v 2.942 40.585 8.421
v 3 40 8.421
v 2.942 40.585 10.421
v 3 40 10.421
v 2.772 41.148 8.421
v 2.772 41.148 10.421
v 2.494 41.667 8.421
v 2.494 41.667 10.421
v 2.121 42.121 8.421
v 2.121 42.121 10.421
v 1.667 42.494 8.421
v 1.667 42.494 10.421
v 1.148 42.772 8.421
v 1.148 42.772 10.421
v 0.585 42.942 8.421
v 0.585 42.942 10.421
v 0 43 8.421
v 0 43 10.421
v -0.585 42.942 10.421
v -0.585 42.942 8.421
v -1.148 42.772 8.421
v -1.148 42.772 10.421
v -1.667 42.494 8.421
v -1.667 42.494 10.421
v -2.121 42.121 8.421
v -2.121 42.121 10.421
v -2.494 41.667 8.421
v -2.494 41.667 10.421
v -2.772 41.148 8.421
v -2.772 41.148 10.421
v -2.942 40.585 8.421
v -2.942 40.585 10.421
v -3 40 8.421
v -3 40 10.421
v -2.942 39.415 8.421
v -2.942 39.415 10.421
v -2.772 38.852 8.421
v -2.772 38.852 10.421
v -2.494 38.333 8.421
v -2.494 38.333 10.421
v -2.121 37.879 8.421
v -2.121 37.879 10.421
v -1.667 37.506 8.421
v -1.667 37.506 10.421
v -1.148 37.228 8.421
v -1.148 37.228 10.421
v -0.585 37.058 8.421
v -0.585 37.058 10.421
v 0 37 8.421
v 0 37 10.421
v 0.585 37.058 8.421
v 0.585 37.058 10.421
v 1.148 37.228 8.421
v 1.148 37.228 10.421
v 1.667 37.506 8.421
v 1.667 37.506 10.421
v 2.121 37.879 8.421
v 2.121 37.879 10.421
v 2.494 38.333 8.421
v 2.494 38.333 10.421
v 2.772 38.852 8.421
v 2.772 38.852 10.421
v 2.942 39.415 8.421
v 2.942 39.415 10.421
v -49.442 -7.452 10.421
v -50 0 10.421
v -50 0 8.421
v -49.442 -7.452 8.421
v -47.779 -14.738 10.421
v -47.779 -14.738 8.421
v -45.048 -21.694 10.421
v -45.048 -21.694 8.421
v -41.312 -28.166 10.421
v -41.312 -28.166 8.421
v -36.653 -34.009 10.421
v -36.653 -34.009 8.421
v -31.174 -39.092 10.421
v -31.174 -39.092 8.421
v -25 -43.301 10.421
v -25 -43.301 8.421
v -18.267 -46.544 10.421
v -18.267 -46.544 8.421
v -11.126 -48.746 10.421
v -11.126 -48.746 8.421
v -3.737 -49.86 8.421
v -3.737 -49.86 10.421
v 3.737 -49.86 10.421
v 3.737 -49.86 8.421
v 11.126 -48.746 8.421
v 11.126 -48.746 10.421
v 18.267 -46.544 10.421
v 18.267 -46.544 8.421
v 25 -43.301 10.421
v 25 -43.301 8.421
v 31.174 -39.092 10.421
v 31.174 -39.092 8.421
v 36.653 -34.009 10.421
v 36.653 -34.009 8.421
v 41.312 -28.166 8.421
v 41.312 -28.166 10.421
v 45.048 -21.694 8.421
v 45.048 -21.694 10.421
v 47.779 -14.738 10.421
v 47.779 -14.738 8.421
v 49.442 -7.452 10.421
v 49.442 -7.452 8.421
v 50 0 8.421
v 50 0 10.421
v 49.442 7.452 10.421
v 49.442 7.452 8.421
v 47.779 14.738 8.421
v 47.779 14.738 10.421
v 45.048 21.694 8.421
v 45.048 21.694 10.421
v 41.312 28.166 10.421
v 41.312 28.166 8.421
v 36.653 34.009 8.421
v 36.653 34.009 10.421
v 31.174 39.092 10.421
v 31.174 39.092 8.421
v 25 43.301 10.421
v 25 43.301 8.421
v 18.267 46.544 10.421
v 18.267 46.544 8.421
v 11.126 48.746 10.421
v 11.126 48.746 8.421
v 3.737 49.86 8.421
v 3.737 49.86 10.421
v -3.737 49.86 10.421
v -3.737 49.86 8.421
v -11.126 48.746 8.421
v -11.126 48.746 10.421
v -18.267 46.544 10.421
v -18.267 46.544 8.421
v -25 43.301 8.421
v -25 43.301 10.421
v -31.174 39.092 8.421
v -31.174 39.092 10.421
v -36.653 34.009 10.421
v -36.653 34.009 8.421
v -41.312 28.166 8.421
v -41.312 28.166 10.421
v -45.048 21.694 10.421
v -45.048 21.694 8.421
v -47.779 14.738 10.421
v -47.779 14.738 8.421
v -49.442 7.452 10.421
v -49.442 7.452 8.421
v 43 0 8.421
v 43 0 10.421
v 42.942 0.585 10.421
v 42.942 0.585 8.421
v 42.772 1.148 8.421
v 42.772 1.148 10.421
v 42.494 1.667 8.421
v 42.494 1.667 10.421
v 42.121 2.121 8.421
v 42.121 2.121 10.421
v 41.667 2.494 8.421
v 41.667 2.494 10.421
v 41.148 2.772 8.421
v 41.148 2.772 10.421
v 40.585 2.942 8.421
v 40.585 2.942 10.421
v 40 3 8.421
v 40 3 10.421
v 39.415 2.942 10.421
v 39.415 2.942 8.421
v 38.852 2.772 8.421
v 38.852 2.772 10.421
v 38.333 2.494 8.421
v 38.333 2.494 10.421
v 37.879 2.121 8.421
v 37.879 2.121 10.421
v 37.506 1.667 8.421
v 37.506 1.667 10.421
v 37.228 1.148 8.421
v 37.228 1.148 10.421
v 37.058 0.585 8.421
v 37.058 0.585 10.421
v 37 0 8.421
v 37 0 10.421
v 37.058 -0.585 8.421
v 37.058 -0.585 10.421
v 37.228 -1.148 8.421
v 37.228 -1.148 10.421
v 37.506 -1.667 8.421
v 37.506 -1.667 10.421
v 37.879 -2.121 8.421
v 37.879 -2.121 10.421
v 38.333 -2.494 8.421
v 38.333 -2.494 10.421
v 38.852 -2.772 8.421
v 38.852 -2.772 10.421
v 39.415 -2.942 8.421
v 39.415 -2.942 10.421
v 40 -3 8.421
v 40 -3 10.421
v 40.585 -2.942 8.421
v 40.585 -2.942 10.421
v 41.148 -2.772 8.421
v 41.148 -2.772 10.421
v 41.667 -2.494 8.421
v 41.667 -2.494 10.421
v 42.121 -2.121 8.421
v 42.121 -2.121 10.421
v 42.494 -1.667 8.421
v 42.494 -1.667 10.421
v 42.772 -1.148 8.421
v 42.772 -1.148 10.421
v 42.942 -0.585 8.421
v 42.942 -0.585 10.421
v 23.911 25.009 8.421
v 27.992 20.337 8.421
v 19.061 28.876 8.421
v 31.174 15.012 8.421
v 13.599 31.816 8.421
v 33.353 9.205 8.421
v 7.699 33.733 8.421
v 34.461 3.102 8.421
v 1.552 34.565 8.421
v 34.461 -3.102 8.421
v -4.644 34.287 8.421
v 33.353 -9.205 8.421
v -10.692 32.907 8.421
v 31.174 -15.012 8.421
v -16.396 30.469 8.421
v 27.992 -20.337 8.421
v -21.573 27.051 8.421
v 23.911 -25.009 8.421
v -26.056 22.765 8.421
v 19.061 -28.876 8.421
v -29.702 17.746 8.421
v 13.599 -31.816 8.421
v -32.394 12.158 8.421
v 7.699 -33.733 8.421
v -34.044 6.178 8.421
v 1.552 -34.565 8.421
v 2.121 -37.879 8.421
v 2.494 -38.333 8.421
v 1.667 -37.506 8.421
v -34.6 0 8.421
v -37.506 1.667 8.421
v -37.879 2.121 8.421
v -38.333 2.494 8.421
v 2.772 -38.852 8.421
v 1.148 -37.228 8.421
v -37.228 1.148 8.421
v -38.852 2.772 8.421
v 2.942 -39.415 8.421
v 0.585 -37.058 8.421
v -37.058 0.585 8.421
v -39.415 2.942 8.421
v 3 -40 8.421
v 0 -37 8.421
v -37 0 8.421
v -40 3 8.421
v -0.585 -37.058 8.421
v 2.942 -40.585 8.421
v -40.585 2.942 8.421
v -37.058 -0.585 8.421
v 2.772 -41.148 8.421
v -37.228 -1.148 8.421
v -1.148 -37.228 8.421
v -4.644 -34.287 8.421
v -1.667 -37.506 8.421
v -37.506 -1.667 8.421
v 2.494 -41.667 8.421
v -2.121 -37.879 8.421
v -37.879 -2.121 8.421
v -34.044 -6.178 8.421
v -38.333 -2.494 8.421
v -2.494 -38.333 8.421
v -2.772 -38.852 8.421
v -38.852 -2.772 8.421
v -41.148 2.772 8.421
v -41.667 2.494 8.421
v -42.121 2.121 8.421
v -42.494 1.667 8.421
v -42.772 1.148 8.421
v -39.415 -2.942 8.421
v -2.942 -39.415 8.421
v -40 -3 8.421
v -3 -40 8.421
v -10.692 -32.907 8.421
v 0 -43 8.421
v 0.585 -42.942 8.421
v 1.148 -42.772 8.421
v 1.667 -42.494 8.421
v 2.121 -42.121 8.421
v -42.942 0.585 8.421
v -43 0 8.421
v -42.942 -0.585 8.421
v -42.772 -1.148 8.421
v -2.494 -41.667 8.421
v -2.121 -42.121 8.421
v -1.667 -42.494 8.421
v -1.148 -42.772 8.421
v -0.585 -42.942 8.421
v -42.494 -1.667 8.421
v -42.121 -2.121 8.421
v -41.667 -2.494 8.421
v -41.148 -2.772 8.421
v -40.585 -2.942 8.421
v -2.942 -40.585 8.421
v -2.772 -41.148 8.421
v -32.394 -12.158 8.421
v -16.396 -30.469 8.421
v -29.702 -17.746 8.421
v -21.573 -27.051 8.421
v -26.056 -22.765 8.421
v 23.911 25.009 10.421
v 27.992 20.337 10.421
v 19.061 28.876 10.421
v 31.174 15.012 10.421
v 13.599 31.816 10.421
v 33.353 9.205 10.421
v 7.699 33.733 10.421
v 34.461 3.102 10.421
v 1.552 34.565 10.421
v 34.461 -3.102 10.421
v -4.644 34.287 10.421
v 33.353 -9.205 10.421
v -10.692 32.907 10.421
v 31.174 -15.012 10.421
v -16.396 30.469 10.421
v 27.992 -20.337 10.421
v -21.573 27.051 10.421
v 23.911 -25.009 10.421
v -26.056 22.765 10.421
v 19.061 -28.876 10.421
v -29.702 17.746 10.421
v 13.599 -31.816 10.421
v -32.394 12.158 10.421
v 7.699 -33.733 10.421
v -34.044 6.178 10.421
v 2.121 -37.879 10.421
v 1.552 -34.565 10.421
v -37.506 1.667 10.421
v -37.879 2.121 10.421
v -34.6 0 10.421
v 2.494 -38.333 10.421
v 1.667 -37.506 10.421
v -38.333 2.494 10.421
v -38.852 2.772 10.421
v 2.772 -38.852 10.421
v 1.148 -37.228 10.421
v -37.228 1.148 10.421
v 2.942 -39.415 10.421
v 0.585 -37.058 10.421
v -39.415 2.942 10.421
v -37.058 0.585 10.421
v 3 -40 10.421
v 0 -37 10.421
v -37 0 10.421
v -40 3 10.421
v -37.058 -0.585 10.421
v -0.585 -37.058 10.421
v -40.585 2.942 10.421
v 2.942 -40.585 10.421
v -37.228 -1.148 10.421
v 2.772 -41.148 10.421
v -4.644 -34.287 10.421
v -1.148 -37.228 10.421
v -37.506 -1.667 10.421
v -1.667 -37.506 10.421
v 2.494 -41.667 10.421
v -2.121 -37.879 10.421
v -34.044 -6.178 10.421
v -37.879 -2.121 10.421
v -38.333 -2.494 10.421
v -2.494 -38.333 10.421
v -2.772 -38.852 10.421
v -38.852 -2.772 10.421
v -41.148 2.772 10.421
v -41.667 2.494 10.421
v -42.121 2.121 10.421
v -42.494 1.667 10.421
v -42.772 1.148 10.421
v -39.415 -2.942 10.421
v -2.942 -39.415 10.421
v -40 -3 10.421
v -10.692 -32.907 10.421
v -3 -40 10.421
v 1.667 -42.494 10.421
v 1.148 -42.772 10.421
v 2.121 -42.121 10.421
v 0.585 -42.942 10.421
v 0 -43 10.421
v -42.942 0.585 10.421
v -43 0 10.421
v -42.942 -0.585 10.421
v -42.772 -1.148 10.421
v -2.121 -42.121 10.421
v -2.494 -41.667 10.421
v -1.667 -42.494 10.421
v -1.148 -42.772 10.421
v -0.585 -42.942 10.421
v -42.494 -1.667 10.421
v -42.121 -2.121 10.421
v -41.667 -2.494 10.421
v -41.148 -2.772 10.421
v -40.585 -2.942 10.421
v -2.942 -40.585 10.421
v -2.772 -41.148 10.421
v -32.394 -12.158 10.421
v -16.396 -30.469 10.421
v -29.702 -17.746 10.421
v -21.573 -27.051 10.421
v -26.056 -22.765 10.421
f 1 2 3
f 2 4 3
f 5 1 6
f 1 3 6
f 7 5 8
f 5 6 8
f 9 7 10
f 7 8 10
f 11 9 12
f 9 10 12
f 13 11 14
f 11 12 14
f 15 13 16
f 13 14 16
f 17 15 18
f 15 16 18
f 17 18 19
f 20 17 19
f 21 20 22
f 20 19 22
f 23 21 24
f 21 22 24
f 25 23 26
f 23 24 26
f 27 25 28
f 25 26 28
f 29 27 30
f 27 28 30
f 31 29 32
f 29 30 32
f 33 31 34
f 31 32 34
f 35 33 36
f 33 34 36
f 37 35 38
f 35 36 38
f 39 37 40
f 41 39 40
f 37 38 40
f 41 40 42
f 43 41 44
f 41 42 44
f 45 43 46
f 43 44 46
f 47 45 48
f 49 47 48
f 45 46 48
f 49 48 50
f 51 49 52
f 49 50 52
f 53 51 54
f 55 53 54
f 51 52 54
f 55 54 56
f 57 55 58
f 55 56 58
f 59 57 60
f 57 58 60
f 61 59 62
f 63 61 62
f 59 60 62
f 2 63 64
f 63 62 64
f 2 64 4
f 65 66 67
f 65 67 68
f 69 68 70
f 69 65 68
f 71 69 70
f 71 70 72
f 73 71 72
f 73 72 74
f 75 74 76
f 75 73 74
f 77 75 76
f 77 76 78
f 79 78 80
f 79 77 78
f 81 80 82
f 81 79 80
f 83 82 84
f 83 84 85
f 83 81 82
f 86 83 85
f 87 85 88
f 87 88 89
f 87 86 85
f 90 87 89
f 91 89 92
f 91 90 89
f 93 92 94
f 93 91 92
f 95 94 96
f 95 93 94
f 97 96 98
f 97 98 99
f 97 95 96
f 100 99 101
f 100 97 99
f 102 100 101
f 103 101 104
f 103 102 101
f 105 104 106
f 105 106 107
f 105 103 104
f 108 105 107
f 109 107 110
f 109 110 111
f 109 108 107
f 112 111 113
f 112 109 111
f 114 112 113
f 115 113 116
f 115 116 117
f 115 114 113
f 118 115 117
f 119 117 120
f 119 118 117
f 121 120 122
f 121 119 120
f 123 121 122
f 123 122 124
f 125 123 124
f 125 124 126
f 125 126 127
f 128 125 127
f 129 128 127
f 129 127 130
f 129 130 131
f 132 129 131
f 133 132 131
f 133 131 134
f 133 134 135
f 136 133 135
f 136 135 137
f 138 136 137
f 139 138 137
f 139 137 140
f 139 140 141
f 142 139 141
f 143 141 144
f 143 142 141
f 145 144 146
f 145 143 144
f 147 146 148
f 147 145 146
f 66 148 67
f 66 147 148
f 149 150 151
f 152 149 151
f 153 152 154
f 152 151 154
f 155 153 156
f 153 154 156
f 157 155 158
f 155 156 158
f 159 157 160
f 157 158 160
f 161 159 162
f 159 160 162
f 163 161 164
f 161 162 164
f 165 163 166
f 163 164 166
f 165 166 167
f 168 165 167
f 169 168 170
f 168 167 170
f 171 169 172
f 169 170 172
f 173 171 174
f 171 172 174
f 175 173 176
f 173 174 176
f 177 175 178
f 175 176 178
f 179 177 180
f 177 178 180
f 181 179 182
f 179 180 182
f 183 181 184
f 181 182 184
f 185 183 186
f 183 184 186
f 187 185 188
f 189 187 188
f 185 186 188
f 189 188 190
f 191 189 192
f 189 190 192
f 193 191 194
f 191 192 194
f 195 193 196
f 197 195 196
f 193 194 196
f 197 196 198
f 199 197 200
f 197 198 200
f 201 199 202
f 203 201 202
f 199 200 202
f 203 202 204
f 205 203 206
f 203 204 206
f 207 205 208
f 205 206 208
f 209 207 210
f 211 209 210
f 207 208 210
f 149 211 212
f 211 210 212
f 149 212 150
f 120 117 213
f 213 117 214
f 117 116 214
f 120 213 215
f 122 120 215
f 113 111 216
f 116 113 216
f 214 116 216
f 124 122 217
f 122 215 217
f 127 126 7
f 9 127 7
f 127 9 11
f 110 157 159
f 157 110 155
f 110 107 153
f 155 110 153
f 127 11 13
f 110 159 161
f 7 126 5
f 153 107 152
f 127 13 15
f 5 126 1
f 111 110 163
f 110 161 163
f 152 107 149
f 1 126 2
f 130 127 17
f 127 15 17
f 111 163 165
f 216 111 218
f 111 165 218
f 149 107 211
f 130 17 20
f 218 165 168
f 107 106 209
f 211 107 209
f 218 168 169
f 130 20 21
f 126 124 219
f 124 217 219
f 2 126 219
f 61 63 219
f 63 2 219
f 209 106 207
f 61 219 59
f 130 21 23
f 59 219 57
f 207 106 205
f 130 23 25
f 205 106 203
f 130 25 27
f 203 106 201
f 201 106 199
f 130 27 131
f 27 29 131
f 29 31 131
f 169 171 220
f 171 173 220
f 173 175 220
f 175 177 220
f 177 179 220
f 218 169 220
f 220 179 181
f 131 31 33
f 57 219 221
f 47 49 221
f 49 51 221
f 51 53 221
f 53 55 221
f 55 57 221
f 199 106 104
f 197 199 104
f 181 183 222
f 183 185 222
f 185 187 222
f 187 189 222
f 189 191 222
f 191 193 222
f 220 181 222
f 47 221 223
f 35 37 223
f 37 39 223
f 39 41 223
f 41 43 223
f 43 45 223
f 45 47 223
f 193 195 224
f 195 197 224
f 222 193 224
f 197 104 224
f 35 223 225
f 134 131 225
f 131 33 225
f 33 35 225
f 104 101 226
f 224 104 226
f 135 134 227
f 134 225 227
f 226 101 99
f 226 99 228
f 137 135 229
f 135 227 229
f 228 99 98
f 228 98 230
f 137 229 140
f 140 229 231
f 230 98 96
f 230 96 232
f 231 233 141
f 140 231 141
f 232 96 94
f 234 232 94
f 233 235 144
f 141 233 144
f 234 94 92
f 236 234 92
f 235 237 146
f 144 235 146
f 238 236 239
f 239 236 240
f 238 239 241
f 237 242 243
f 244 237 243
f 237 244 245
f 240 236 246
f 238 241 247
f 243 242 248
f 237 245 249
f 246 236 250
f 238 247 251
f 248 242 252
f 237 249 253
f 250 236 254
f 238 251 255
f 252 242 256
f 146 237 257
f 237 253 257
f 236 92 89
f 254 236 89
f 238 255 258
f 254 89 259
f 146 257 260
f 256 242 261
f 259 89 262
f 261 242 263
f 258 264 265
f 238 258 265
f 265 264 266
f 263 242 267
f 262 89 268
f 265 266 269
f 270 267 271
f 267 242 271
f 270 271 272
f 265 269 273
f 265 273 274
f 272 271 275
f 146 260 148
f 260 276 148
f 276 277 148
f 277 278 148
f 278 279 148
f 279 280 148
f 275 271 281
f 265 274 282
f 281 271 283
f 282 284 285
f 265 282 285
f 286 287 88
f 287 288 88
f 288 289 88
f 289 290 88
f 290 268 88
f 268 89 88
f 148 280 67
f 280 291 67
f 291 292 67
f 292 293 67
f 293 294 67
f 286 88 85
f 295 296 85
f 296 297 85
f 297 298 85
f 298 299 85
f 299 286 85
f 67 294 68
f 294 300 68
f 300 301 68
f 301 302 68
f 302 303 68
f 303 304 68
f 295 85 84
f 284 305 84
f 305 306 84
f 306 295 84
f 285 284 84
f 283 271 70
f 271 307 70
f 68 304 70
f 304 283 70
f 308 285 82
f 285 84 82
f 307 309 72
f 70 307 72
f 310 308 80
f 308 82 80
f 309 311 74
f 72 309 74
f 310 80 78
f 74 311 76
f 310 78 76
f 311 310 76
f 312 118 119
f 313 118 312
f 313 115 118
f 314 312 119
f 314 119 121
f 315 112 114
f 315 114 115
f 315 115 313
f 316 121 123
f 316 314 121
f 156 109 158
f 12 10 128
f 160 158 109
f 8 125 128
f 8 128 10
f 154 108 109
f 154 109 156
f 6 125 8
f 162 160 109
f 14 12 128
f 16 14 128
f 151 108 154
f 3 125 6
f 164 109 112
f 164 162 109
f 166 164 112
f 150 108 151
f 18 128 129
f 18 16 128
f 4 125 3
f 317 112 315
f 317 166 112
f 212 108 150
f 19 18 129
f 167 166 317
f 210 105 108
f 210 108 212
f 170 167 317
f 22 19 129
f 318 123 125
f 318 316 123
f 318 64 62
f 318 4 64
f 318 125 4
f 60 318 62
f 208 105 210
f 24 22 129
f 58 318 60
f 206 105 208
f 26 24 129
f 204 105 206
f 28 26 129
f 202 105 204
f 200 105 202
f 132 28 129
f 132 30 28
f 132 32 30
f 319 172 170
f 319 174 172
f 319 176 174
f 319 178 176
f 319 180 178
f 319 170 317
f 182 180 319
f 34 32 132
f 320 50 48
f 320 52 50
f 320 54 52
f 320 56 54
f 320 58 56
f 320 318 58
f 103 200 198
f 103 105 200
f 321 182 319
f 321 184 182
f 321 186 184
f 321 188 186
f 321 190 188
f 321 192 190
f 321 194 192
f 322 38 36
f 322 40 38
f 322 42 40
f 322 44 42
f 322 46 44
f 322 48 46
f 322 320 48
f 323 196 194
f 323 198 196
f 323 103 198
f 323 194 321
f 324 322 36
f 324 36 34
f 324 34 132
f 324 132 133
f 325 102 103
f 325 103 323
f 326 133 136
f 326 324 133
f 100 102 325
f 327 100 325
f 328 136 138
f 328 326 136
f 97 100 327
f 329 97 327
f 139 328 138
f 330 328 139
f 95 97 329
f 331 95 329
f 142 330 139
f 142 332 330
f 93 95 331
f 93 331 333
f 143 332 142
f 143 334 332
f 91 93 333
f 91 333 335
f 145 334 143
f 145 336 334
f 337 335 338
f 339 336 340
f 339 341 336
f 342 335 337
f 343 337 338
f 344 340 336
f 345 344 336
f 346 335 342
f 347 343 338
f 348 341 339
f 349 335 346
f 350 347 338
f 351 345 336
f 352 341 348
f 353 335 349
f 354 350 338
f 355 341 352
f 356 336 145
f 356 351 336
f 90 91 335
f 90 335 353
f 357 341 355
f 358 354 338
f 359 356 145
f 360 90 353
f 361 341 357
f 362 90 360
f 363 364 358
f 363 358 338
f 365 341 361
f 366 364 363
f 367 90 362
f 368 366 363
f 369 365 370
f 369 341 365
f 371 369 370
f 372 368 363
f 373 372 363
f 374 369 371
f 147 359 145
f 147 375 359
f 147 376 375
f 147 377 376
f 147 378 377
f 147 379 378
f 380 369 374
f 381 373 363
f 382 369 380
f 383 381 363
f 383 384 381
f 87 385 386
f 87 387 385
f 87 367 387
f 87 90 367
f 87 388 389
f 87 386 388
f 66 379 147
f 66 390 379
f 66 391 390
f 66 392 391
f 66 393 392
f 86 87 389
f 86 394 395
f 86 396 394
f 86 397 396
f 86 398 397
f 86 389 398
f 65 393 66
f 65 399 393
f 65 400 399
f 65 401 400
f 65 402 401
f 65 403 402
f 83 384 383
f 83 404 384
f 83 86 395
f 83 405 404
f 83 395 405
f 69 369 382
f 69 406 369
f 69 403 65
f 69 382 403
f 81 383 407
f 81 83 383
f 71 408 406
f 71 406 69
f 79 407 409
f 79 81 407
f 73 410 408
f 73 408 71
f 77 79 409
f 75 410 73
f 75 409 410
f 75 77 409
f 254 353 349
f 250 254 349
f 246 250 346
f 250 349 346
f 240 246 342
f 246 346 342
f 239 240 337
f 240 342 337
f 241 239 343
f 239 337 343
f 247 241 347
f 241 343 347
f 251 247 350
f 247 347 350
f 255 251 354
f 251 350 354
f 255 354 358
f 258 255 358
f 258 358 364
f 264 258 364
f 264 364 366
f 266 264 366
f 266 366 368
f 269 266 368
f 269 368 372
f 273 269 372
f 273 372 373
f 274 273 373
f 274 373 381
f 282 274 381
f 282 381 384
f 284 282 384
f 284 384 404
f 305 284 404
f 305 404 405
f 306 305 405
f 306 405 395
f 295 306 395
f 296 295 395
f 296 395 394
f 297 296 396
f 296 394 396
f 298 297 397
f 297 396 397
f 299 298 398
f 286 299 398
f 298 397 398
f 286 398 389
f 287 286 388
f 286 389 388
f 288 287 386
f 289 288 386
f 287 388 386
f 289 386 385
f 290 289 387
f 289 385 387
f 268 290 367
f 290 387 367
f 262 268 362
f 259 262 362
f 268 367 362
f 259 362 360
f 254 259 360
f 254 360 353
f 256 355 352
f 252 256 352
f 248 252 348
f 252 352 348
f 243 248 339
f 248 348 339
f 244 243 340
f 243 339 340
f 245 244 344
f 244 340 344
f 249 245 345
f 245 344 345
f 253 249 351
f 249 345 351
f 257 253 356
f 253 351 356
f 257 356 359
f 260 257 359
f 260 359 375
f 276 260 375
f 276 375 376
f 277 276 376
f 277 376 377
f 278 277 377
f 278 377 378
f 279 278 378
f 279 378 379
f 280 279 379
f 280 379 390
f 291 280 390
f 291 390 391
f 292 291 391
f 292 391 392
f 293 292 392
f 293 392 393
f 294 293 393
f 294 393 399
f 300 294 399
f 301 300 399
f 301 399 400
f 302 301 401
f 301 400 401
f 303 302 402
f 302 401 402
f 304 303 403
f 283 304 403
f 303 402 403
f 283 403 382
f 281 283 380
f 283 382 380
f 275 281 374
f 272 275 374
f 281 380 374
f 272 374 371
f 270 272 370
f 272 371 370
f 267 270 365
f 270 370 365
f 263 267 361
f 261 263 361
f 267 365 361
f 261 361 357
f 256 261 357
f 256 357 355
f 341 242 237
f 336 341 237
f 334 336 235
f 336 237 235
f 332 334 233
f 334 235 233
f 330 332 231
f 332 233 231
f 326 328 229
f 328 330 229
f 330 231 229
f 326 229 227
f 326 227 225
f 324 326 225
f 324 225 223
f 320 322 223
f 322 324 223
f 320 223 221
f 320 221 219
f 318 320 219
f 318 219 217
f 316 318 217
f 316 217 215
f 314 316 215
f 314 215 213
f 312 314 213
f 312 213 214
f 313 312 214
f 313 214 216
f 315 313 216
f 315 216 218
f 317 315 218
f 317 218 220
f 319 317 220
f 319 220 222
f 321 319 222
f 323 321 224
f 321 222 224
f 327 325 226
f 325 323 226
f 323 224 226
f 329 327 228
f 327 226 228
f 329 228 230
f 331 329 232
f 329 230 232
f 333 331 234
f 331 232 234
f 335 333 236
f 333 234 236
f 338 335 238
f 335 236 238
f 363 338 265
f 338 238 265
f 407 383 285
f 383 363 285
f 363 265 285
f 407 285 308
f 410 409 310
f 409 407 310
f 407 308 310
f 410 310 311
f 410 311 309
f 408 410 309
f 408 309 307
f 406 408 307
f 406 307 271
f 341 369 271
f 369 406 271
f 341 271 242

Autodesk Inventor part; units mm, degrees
ref_plane "YZ Plane" through (0, 0, 0) normal (1, 0, 0) x (0, 1, 0)
ref_plane "XZ Plane" through (0, 0, 0) normal (0, 1, 0) x (-1, 0, 0)
ref_plane "XY Plane" through (0, 0, 0) normal (0, 0, 1) x (1, 0, 0)
sketch "Szkic1" plane through (0, 0, 0) normal (0, 1, 0) x (-1, 0, 0)
  line L0 (34.6, 10.4209) -> (34.6, 8.4209)
  line L1 (34.6, 8.4209) -> (50, 8.4209)
  line L2 (50, 8.4209) -> (50, 10.4209)
  line L3 (50, 10.4209) -> (34.6, 10.4209)
  line L4 (0, 0) -> (0, 76.2035)
  dimension "d0" = 15.4
  dimension "d1" = 2
  dimension "d2" = 34.6
revolve "Obrót1" add sketch "Szkic1" angle 360 about axis through (0, 0, 0) along (0, 0, 1)
sketch "Szkic5" plane through (0, 0, 10.4209) normal (0, 0, 1) x (1, 0, 0)
  circle A0 centre (0, 40) radius 3
  circle A1 centre (40, 0) radius 3
  circle A2 centre (0, -40) radius 3
  circle A3 centre (-40, 0) radius 3
  point P0 (0, 0)
  dimension "d16" = 6
  dimension "d17" = 6
  dimension "d18" = 6
  dimension "d19" = 6
extrude "Wyciągnięcie proste3" cut sketch "Szkic5" against normal blind 2
properties part number "uszczelka" material "Poliwęglan dymiony"
